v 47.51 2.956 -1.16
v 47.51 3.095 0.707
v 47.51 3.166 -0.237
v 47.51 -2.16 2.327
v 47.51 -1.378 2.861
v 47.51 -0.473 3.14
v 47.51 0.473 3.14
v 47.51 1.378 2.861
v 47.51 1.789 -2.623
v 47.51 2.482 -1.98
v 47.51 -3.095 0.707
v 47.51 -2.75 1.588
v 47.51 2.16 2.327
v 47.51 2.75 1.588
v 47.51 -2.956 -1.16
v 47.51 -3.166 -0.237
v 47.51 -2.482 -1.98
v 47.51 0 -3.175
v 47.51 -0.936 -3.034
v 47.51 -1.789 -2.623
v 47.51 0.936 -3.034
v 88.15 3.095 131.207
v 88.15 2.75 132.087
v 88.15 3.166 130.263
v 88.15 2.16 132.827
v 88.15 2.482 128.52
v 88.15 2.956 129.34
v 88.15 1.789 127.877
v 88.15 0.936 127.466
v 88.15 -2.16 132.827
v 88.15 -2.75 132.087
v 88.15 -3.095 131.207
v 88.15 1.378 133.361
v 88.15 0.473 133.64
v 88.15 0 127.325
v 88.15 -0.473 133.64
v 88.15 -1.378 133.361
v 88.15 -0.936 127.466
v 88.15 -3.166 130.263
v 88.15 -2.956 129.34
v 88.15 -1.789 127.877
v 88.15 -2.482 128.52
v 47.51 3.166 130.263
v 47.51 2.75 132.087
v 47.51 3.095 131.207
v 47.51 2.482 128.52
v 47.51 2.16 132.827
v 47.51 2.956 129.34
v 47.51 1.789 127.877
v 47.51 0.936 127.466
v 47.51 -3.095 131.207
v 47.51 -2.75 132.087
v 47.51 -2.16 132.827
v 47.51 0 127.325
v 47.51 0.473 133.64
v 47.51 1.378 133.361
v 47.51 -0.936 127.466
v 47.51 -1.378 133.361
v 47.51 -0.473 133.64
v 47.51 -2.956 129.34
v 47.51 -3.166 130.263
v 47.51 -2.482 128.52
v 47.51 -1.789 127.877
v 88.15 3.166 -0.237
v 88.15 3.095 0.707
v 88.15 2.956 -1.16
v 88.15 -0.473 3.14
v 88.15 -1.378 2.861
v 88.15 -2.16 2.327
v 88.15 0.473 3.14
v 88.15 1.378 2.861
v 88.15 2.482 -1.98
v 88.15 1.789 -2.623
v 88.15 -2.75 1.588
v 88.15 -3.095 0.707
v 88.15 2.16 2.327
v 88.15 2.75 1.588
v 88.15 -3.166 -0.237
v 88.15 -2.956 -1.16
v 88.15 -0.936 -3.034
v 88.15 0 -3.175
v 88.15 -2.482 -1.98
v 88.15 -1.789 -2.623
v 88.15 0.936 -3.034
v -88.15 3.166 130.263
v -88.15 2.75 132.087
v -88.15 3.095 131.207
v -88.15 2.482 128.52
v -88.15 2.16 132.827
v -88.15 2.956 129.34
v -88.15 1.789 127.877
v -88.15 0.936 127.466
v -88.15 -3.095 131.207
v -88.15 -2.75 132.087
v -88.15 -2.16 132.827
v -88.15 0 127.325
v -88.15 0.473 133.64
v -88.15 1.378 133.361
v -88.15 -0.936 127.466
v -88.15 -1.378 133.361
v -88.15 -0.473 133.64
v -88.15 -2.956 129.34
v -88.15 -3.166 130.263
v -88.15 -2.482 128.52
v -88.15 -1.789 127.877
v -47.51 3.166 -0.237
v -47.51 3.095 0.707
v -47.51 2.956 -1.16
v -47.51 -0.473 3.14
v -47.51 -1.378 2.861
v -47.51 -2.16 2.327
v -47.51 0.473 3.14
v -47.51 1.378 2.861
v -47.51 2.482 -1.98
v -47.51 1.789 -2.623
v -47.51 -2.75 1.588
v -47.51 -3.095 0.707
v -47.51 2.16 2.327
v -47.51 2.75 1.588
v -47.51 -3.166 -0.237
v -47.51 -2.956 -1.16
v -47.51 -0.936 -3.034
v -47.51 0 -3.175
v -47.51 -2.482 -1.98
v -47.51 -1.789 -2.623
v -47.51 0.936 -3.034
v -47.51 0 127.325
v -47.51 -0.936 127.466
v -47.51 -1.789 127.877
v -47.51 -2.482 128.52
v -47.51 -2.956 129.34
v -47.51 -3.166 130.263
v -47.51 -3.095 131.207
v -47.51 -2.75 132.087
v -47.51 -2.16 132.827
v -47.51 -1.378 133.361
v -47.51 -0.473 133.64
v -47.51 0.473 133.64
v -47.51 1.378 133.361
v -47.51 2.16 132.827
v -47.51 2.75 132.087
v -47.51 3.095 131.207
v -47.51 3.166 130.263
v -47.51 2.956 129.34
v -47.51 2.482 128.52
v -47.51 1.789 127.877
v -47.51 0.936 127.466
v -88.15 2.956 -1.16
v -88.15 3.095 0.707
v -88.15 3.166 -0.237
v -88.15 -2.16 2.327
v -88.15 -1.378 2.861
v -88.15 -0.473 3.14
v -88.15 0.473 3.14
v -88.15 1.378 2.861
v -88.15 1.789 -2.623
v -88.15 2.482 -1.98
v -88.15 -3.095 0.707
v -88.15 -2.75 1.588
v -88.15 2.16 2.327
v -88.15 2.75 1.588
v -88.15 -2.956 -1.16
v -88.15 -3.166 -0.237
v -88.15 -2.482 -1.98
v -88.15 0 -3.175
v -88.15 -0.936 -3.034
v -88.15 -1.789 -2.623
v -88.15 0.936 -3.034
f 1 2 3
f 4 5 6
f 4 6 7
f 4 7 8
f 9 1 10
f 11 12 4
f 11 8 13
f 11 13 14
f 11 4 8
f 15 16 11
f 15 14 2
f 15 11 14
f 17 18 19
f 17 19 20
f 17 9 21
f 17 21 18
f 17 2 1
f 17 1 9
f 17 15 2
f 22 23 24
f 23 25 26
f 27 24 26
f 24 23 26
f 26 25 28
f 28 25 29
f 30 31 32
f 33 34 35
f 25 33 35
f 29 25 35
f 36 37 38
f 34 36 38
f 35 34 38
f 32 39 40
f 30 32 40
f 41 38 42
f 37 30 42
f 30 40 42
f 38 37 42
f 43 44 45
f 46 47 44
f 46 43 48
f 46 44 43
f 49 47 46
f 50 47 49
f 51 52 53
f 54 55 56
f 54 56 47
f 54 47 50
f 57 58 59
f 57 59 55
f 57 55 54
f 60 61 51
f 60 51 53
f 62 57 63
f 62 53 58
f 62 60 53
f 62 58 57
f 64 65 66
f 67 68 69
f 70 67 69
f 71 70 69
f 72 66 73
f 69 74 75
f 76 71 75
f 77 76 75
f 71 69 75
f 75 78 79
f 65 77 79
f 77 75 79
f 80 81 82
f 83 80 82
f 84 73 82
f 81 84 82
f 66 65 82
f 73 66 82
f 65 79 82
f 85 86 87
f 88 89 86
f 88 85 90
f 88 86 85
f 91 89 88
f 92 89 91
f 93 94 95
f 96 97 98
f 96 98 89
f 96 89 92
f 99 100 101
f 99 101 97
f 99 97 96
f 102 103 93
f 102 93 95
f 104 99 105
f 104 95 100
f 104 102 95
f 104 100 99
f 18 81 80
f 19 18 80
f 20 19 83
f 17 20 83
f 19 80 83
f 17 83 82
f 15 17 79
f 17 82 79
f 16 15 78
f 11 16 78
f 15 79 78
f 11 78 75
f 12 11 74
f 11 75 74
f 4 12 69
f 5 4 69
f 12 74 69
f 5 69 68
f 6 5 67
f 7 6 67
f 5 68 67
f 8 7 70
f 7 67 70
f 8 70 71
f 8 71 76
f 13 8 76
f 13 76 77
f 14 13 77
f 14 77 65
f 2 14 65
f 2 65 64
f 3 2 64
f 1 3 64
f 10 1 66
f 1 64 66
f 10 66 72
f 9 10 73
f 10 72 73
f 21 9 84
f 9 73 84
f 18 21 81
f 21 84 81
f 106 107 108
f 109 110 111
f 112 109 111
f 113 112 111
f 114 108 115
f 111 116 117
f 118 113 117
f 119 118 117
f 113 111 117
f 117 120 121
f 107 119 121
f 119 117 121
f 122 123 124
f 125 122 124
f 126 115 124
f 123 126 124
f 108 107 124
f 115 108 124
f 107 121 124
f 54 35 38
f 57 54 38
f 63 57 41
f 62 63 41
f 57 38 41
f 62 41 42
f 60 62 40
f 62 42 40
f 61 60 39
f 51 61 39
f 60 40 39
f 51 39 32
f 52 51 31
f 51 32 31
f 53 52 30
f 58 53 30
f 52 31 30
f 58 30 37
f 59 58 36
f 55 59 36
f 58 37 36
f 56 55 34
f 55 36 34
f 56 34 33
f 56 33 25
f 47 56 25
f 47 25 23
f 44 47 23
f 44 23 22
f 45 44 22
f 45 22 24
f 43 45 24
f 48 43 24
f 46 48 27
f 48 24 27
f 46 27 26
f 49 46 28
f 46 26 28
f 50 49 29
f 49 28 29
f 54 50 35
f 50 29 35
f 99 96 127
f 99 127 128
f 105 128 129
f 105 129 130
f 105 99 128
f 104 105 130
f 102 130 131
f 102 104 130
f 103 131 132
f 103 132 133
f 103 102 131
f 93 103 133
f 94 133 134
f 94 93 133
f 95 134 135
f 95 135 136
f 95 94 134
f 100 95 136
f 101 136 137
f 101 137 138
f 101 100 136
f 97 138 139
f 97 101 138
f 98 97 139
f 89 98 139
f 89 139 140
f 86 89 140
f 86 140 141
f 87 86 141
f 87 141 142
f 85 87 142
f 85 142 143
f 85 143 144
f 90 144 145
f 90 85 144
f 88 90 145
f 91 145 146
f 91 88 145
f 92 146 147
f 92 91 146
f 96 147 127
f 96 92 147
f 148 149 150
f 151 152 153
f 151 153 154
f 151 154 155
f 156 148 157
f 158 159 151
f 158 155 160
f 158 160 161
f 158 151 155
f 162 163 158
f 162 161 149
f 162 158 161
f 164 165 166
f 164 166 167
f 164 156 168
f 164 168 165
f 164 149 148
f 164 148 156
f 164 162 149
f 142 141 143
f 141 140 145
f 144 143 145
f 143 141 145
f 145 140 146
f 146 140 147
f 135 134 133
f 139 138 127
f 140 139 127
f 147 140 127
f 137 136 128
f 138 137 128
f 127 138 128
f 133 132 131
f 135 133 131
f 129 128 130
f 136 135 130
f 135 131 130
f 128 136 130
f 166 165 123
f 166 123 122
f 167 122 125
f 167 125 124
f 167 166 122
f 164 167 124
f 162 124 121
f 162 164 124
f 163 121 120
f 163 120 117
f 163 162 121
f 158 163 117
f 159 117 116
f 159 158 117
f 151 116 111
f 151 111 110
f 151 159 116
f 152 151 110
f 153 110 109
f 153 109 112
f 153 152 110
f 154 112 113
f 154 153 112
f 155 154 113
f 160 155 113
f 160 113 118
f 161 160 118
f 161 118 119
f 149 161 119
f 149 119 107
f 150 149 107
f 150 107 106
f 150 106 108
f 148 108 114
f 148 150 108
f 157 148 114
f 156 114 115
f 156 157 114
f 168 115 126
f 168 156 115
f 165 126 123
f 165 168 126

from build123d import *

# Parameters (mm, degrees)
SKETCH1_R             = 3.175
BOSS_EXTRUDE1_DEPTH   = 40.640000048
BOSS_EXTRUDE1_2_DEPTH = 40.640000048


with BuildPart() as part:
    # Sketch1 → Boss-Extrude1 (new body)
    with BuildSketch(Plane.ZY.offset(-88.15)):
        with Locations(Location((130.499998656, 0, 0), (0, 0, 180))):
            Circle(SKETCH1_R)
    extrude(amount=BOSS_EXTRUDE1_DEPTH)


with BuildPart() as body_2:
    # Sketch1 → Boss-Extrude1 2 (new body)
    with BuildSketch(Plane.ZY.offset(-88.15)):
        with Locations(Location((0, 0, 0), (0, 0, 180))):
            Circle(SKETCH1_R)
    extrude(amount=BOSS_EXTRUDE1_2_DEPTH)


with BuildPart() as body_3:
    # Mirror1: mirrored copy
    add(part.part.mirror(Plane(origin=(0, 0, 0), x_dir=(0, 0, 1), z_dir=(1, 0, 0))))


with BuildPart() as body_4:
    # Mirror1 2: mirrored copy
    add(body_2.part.mirror(Plane(origin=(0, 0, 0), x_dir=(0, 0, 1), z_dir=(1, 0, 0))))


solid = Compound([part.part, body_2.part, body_3.part, body_4.part])
